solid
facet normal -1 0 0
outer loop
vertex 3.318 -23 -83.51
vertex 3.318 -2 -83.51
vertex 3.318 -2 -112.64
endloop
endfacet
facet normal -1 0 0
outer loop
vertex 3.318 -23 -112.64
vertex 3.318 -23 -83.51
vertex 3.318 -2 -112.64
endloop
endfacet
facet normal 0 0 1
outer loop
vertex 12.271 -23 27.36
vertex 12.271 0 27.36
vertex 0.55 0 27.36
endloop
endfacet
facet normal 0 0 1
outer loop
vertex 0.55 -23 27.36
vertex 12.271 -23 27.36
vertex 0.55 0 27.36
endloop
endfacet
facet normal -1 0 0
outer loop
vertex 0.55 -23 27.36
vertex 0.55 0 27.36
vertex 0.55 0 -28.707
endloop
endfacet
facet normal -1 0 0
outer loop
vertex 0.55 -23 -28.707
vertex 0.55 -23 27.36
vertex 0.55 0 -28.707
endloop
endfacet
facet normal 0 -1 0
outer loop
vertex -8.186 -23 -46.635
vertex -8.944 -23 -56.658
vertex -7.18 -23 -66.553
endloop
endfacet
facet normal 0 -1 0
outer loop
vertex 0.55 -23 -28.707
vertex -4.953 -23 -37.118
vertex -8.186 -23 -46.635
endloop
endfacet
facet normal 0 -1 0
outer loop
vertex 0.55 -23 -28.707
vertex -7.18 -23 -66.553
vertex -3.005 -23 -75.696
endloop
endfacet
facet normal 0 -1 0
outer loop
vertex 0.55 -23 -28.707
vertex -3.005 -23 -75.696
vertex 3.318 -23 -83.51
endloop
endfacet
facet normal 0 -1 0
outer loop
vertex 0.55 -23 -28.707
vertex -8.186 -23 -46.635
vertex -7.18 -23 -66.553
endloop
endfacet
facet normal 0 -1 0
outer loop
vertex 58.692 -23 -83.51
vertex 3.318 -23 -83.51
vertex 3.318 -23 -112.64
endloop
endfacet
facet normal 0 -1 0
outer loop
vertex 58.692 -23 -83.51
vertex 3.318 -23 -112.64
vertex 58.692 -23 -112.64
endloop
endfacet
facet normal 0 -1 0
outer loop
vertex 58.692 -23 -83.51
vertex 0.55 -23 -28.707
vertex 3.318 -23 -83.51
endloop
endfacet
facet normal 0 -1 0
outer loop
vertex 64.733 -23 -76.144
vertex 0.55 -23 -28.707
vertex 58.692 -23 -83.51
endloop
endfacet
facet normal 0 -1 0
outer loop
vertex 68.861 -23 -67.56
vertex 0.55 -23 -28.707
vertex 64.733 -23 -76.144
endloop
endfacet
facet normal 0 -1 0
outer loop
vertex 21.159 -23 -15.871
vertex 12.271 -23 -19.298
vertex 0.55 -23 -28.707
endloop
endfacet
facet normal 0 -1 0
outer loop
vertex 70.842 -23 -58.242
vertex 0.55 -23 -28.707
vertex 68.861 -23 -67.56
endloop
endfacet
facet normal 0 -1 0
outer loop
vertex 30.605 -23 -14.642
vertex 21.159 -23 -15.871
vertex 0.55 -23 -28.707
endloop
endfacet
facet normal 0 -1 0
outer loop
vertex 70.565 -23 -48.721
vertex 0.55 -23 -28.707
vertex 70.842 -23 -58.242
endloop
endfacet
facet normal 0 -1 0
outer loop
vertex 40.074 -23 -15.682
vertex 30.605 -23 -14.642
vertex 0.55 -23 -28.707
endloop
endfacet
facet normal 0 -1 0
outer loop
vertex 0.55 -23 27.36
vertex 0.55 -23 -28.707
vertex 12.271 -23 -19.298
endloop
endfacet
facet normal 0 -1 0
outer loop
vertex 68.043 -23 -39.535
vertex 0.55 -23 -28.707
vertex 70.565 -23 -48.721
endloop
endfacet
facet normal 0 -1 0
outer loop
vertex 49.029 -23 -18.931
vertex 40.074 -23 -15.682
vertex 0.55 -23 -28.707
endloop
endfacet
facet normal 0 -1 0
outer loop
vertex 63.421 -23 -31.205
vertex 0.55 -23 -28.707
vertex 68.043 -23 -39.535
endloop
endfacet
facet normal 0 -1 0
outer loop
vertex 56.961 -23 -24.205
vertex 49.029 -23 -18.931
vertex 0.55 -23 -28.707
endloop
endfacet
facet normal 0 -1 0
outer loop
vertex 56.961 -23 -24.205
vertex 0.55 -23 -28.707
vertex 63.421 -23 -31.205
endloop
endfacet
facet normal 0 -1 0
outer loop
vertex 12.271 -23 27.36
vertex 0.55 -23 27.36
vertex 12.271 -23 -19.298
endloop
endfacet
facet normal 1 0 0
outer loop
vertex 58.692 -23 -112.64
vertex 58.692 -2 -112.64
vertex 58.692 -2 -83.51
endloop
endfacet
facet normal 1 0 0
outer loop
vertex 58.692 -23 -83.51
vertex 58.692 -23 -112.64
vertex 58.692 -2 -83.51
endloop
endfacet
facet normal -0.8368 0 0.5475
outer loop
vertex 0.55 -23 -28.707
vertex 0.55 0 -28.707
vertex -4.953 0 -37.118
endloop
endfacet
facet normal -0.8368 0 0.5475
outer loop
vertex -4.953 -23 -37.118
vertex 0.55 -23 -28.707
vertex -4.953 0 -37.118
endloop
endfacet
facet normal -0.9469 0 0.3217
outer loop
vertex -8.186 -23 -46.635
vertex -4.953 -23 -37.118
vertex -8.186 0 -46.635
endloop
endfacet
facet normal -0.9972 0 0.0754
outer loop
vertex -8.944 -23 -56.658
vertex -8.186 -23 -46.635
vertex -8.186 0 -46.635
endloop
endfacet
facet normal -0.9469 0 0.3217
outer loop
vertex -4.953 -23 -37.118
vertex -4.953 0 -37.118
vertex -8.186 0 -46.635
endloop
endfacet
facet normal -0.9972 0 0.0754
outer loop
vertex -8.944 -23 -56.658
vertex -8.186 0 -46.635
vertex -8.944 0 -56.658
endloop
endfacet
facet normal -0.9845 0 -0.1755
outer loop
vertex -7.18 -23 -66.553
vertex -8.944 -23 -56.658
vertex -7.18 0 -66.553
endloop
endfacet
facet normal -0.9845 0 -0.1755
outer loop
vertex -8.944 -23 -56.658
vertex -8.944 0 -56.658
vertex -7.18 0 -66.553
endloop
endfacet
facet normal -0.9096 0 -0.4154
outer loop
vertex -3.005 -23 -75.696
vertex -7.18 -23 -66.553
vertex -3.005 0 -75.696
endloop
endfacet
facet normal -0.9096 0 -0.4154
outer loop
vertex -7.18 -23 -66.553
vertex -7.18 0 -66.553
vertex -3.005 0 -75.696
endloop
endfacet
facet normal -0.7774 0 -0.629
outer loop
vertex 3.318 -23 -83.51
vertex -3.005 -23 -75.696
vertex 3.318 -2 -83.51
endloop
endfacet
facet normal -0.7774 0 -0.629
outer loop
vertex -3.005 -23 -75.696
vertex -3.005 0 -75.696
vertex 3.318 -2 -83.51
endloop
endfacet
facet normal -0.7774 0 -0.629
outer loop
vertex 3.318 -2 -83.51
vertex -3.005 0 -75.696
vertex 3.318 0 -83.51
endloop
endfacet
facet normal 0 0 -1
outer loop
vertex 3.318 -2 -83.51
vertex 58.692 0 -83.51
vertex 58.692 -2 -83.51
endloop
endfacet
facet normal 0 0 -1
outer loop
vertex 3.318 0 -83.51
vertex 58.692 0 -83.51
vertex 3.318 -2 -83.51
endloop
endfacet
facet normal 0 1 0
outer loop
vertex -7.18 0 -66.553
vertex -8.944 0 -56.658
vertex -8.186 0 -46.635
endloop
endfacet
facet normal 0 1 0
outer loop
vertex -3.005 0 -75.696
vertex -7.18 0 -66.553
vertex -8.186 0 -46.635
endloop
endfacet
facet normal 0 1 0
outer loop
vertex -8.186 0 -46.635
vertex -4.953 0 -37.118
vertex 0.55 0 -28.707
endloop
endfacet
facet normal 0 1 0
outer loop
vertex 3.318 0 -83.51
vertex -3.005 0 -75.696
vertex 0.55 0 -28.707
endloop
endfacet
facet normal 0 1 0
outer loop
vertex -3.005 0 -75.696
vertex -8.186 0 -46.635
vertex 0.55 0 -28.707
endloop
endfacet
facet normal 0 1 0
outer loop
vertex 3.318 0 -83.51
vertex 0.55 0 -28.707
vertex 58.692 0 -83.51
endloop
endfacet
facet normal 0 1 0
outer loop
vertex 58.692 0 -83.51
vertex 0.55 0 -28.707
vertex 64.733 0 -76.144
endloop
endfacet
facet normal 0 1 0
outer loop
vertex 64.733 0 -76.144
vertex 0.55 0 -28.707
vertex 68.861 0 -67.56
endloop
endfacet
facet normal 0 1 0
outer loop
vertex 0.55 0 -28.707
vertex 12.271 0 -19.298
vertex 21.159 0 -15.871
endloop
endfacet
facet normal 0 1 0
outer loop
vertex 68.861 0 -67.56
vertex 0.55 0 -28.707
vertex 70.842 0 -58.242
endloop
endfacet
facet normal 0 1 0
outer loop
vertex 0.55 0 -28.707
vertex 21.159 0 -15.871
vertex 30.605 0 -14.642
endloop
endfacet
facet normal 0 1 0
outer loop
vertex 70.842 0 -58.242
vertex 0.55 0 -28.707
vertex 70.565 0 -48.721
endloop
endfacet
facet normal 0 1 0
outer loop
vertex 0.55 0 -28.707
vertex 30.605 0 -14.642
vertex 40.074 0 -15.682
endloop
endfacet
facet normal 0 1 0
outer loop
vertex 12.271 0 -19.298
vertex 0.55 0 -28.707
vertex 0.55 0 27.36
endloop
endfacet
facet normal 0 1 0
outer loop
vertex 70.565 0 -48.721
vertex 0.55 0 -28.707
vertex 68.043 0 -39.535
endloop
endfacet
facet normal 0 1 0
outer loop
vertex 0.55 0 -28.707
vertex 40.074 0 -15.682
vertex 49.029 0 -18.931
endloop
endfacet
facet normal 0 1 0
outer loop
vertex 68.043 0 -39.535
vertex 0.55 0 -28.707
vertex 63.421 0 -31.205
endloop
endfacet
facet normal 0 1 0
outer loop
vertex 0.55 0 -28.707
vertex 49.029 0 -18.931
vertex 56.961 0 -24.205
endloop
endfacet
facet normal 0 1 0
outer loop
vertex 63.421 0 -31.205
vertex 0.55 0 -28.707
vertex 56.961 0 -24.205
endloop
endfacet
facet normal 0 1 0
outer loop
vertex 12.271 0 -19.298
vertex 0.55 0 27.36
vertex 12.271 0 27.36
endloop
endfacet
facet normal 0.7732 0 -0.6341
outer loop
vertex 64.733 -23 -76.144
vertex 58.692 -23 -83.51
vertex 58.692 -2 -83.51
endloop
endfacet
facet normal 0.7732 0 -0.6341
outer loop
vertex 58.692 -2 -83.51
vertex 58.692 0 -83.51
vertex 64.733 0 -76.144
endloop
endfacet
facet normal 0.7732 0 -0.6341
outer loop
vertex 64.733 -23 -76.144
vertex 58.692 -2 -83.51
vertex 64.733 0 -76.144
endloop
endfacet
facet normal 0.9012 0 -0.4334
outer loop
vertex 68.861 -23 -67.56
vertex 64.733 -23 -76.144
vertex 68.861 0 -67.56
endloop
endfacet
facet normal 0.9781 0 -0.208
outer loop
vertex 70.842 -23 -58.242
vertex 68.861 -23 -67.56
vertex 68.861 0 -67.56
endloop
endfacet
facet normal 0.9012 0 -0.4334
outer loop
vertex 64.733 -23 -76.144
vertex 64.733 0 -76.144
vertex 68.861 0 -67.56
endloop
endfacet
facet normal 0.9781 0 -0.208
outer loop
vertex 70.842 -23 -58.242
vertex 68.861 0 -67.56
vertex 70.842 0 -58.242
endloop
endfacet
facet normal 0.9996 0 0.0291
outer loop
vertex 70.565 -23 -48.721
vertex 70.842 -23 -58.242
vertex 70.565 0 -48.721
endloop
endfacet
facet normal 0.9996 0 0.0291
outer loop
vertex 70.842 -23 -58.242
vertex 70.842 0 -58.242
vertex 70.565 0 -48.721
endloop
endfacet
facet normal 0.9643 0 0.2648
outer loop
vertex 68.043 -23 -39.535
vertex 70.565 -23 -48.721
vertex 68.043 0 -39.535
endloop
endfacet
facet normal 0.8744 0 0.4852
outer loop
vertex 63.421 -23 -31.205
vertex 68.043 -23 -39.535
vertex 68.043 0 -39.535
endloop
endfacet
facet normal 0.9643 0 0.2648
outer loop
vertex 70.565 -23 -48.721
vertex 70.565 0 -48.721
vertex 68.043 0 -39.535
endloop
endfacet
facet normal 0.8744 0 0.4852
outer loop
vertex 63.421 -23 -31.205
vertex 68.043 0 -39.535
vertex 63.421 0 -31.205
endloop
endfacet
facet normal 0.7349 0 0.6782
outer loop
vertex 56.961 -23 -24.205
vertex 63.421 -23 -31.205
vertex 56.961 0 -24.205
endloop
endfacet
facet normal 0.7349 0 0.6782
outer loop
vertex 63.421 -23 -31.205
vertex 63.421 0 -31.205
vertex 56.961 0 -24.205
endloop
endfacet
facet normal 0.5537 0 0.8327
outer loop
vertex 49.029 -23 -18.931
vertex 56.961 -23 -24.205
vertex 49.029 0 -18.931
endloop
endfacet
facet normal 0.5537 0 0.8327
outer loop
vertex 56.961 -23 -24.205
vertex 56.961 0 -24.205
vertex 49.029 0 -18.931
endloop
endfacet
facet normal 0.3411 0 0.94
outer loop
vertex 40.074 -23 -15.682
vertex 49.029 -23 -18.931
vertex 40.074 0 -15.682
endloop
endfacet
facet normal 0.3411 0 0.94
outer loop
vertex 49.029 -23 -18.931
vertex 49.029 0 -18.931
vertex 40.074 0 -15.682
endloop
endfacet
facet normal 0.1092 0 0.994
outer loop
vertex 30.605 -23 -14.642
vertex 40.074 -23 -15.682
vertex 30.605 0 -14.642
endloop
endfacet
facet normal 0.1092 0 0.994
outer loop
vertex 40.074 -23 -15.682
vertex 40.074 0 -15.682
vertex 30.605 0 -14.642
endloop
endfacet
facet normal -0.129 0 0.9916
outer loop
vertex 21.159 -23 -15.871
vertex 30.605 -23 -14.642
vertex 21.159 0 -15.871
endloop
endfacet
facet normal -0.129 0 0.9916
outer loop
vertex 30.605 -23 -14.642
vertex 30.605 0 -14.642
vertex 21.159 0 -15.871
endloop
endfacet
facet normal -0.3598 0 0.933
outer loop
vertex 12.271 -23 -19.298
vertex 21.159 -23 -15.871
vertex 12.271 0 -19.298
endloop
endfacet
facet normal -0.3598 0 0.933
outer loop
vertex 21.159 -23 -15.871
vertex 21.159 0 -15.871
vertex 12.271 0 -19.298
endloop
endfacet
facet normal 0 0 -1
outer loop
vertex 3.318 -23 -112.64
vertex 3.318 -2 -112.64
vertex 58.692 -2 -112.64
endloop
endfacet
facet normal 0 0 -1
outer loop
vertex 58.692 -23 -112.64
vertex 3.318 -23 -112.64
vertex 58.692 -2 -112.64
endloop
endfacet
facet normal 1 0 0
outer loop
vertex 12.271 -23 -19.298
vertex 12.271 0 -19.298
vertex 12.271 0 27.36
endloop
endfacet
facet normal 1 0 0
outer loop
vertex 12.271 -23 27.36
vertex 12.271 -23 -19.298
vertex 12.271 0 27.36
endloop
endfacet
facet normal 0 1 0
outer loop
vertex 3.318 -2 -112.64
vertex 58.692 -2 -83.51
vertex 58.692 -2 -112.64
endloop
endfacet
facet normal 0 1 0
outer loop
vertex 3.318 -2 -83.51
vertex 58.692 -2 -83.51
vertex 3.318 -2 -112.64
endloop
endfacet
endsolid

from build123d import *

# Parameters (mm, degrees)
F1_DEPTH = 23
F2_W     = 55.3733881378
F2_H     = 29.1305183362
F3_DEPTH = 2


with BuildPart() as f1:
    # F0 (on Front) → F1 (new body)
    with BuildSketch(Plane.XZ):
        with BuildLine():
            Line((58.6916125421, -112.6401221338), (58.6916125421, -83.5096037976))
            ThreePointArc((58.6916125421, -83.5096037976), (63.4212285001, -31.2054716299), (12.2713760607, -19.2981585681))
            Line((12.2713760607, -19.2981585681), (12.2713760607, 27.3598778662))
            Line((12.2713760607, 27.3598778662), (0.550356732, 27.3598778662))
            Line((0.550356732, 27.3598778662), (0.550356732, -28.7071379409))
            ThreePointArc((0.550356732, -28.7071379409), (-8.9441612758, -56.657800803), (3.3182244043, -83.5096037976))
            Line((3.3182244043, -83.5096037976), (3.3182244043, -112.6401221338))
            Line((3.3182244043, -112.6401221338), (58.6916125421, -112.6401221338))
        make_face()
    extrude(amount=F1_DEPTH)

    # F2 (on face) → F3 (cut)
    with BuildSketch(Plane(origin=(0, 0, 0), x_dir=(-1, 0, 0), z_dir=(0, 1, 0))):
        with Locations((-31.0049184732, -98.0748629657)):
            Rectangle(F2_W, F2_H)
    extrude(amount=-F3_DEPTH, mode=Mode.SUBTRACT)


solid = f1.part
